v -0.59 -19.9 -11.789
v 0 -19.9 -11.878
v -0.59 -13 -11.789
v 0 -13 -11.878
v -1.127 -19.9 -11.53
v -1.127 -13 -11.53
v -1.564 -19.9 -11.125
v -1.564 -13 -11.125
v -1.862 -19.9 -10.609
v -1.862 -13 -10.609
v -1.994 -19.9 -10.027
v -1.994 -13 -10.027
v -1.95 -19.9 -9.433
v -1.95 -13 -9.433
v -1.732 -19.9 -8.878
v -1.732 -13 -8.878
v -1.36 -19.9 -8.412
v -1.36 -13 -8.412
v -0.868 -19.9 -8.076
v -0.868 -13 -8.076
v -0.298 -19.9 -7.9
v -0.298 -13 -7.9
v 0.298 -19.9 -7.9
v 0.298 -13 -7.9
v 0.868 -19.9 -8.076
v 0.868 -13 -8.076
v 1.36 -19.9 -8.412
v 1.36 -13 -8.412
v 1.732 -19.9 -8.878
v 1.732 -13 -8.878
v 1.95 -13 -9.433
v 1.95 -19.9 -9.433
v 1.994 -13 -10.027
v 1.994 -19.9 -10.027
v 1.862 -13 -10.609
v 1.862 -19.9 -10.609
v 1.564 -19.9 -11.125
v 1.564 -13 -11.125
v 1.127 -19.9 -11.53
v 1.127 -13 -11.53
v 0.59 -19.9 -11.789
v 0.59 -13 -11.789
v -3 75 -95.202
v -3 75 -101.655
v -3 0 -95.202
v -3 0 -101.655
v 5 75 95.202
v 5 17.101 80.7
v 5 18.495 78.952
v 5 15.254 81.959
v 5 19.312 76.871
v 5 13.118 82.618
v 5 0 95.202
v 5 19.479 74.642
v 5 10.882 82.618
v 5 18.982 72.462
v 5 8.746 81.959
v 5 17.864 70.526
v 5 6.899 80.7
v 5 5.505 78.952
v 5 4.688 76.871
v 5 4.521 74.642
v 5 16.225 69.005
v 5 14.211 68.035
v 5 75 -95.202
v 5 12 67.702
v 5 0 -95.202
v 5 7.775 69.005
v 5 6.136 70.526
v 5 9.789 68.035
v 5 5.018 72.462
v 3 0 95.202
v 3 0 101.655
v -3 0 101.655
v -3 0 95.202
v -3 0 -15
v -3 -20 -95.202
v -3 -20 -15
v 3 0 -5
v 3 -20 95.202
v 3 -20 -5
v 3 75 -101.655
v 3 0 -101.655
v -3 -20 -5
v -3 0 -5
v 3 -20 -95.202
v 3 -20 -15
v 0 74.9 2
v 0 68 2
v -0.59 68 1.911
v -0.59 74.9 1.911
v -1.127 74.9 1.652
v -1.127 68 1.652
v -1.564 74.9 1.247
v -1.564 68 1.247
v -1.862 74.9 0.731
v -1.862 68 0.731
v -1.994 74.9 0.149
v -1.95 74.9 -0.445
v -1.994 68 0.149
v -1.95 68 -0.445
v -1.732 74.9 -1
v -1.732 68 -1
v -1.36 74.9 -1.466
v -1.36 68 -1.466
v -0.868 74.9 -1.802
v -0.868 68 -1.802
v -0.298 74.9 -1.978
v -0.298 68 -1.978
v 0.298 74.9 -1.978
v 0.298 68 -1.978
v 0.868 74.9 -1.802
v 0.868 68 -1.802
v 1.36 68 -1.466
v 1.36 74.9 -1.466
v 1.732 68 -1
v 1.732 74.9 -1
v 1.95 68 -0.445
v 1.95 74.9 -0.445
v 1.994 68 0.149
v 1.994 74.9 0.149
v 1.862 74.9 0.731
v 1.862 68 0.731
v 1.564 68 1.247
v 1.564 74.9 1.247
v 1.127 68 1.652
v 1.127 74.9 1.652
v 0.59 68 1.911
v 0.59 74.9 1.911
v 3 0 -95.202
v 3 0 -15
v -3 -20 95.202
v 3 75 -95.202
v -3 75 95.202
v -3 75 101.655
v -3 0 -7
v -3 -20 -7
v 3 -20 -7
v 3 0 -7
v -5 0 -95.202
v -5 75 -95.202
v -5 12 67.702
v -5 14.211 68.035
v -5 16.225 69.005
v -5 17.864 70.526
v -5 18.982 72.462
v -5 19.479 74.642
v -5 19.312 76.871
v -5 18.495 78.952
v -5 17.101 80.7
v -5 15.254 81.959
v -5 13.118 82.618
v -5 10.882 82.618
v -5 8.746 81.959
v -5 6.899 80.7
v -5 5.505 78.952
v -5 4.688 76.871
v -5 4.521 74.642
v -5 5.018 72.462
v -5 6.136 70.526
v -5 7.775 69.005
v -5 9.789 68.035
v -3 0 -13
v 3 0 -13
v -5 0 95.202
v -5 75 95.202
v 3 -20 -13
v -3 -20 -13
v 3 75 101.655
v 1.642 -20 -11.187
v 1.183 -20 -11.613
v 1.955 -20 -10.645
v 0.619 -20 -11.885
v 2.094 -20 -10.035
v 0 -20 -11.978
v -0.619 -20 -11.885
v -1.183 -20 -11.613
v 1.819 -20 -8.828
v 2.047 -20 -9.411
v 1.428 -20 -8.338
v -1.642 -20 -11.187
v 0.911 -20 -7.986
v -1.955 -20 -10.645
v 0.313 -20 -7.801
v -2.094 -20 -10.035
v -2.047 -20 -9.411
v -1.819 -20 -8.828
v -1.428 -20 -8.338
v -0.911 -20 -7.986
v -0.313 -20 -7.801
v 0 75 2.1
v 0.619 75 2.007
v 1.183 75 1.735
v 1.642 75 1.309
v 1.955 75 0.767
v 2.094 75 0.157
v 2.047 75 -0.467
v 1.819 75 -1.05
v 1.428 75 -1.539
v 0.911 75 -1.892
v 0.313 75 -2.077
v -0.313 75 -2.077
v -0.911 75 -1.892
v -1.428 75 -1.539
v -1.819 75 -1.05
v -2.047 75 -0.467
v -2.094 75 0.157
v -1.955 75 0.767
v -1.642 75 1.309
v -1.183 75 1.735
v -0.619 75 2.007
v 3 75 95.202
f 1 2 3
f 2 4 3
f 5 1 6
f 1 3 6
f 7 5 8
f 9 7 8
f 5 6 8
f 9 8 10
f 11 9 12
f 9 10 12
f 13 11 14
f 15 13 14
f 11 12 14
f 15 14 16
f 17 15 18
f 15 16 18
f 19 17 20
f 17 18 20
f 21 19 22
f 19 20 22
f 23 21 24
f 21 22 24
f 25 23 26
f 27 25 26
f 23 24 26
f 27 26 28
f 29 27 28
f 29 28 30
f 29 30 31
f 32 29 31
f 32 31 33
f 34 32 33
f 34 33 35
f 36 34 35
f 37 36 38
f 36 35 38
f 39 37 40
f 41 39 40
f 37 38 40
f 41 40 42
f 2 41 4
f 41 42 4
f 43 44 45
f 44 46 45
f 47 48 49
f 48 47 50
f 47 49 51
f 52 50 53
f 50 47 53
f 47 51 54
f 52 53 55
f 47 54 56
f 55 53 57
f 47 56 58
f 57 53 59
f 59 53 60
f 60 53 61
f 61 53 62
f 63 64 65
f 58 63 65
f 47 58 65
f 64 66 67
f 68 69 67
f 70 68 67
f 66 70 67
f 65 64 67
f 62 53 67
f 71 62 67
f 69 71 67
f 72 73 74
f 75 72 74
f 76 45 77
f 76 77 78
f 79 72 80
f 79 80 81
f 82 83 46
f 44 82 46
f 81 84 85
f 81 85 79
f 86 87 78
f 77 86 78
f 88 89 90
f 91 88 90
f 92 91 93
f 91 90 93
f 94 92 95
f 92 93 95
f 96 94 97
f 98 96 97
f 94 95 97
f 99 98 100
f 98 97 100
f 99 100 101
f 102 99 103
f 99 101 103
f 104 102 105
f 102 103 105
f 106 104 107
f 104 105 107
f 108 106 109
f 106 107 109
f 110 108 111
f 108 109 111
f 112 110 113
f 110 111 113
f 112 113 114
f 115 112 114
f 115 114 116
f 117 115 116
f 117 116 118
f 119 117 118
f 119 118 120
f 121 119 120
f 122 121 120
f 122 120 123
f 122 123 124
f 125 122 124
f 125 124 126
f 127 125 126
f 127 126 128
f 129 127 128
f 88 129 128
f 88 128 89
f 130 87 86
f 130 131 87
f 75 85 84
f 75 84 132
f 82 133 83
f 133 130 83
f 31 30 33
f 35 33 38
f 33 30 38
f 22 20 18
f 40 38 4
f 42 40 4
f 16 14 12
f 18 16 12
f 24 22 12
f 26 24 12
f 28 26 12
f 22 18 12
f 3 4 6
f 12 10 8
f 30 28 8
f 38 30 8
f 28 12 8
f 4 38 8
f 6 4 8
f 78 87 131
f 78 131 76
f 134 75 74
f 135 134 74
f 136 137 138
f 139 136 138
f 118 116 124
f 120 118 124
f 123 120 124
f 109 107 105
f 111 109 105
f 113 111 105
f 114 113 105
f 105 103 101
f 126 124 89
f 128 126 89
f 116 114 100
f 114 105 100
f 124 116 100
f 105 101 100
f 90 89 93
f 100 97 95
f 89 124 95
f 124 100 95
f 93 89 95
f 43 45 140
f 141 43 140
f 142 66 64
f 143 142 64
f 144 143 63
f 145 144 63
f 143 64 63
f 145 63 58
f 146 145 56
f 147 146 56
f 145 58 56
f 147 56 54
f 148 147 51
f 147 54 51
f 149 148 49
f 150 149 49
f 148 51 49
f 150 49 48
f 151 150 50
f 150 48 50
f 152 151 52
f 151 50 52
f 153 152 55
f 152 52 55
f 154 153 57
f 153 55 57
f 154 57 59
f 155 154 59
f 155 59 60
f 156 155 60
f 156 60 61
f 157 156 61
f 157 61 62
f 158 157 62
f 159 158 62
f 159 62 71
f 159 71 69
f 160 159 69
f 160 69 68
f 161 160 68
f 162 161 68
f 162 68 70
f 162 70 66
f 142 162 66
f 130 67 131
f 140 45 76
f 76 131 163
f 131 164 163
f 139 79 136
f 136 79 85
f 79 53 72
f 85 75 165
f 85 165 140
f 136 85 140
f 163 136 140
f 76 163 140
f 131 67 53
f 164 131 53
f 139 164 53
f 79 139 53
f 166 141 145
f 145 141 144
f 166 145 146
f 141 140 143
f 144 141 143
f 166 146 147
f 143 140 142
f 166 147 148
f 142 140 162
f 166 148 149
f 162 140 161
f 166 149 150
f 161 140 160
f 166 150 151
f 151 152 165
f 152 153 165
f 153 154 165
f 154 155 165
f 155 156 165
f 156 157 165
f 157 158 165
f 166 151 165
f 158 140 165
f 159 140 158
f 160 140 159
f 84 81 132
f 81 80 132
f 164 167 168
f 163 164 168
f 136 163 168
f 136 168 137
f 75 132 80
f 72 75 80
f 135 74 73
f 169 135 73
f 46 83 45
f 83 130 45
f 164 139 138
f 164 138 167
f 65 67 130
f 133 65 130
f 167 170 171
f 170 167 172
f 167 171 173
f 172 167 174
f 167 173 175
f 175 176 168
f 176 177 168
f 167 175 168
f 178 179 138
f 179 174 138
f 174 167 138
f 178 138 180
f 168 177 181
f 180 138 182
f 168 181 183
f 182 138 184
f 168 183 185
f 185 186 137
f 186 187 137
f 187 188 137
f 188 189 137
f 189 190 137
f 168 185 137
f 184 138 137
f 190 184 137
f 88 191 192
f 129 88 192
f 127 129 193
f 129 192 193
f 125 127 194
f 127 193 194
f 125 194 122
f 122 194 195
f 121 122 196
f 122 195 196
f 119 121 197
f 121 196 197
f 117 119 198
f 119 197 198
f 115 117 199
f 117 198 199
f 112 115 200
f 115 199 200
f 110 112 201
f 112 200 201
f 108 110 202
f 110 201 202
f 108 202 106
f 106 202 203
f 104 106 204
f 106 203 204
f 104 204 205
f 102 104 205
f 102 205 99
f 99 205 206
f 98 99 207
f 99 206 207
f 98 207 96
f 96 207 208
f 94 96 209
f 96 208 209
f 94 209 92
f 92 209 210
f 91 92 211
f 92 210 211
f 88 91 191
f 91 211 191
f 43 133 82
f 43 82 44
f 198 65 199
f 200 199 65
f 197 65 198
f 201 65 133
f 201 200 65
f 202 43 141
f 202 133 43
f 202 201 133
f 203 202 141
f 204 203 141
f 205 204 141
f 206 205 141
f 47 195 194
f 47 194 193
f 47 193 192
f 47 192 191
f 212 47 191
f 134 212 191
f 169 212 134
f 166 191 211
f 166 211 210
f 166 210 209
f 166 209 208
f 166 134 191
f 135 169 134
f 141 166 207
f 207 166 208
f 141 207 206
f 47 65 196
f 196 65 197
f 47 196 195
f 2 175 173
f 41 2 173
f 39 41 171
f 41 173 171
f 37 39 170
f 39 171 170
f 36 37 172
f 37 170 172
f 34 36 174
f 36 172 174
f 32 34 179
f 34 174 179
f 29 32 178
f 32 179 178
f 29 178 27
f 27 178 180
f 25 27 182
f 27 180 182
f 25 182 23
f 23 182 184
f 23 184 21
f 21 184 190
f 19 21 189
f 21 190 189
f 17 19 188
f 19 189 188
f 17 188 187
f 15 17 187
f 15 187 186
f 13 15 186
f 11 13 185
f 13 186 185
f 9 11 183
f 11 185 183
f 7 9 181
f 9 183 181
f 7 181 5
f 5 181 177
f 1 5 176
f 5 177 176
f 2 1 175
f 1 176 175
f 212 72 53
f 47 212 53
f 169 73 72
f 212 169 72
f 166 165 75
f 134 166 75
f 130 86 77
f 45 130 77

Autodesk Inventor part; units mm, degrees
ref_plane "YZ Plane" through (0, 0, 0) normal (1, 0, 0) x (0, 1, 0)
ref_plane "XZ Plane" through (0, 0, 0) normal (0, 1, 0) x (-1, 0, 0)
ref_plane "XY Plane" through (0, 0, 0) normal (0, 0, 1) x (1, 0, 0)
sketch "Sketch1" plane through (0, 0, 0) normal (0, 1, 0) x (-1, 0, 0)
  line L0 (5, 95.202) -> (-5, 95.202)
  line L1 (-5, 95.202) -> (-5, -95.202)
  line L2 (-5, -95.202) -> (5, -95.202)
  line L3 (5, -95.202) -> (5, 95.202)
  line L4 (5, 95.202) -> (-5, -95.202) construction
  line L5 (-5, 95.202) -> (5, -95.202) construction
  line L6 (3, 101.655) -> (-3, 101.655)
  line L7 (-3, 101.655) -> (-3, -101.655)
  line L8 (-3, -101.655) -> (3, -101.655)
  line L9 (3, -101.655) -> (3, 101.655)
  line L10 (3, 101.655) -> (-3, -101.655) construction
  line L11 (-3, 101.655) -> (3, -101.655) construction
  line L12 (-3, -13) -> (3, -13)
  line L13 (3, -13) -> (3, -7)
  line L14 (3, -7) -> (-3, -7)
  line L15 (-3, -7) -> (-3, -13)
  line L16 (-3, -15) -> (3, -15)
  line L17 (3, -5) -> (-3, -5)
  point P0 (0, 0)
  point P1 (0, -7)
  point P2 (-3, -95.202)
  point P3 (3, -95.202)
  point P4 (3, 95.202)
  point P5 (-3, 95.202)
  point P6 (-3, -7)
  dimension "d0" = 10
  dimension "d1" = 190.404
  dimension "d2" = 203.31
  dimension "d4" = 6
  dimension "d5" = 82.202
  dimension "d6" = 6
  dimension "d7" = 6
  dimension "d8" = 2
  dimension "d9" = 2
extrude "Extrusion1" add sketch "Sketch1" along normal blind 75
extrude "Extrusion2" add sketch "Sketch1" against normal blind 20 contours L9 L17 L7 L0 | L2 L7 L16 L9 | L9 L12 L7 L14
sketch "Sketch2" plane through (5, 0, 95.202) normal (1, 0, 0) x (0, 0, -1)
  circle A0 centre (20, 12) radius 7.5
  line L0 (0, 0) -> (0, 75) projected
  line L1 (0, 0) -> (190.404, 0) projected
  point P0 (95.202, 0)
  dimension "d14" = 15
  dimension "d15" = 20
  dimension "d16" = 12
extrude "Extrusion3" cut sketch "Sketch2" against normal blind 75
sketch "Sketch3" plane through (0, 75, 0) normal (0, 1, 0) x (1, 0, 0)
  line L0 (-3, -101.655) -> (3, -101.655) projected
  line L1 (-5, 95.202) -> (-5, -95.202) projected
  point P0 (0, 0)
  point P1 (0, 0)
  dimension "d26" = 101.655
  dimension "d27" = 5
hole "Hole1" at (0, 75, 0) direction (0, -1, 0) diameter 4 depth 7 countersink diameter 4.2 countersink angle 90
sketch "Sketch4" plane through (0, -20, 0) normal (0, -1, 0) x (1, 0, 0)
  line L0 (3, -13) -> (3, -7) projected
  point P0 (0, 0)
  point P1 (0, -9.8779)
  dimension "d28" = 3
hole "Hole2" at (0, -20, -9.8779) direction (0, 1, 0) diameter 4 depth 7 countersink diameter 4.2 countersink angle 90
properties part number "sciana_dluga" material "ABS Plastic"
